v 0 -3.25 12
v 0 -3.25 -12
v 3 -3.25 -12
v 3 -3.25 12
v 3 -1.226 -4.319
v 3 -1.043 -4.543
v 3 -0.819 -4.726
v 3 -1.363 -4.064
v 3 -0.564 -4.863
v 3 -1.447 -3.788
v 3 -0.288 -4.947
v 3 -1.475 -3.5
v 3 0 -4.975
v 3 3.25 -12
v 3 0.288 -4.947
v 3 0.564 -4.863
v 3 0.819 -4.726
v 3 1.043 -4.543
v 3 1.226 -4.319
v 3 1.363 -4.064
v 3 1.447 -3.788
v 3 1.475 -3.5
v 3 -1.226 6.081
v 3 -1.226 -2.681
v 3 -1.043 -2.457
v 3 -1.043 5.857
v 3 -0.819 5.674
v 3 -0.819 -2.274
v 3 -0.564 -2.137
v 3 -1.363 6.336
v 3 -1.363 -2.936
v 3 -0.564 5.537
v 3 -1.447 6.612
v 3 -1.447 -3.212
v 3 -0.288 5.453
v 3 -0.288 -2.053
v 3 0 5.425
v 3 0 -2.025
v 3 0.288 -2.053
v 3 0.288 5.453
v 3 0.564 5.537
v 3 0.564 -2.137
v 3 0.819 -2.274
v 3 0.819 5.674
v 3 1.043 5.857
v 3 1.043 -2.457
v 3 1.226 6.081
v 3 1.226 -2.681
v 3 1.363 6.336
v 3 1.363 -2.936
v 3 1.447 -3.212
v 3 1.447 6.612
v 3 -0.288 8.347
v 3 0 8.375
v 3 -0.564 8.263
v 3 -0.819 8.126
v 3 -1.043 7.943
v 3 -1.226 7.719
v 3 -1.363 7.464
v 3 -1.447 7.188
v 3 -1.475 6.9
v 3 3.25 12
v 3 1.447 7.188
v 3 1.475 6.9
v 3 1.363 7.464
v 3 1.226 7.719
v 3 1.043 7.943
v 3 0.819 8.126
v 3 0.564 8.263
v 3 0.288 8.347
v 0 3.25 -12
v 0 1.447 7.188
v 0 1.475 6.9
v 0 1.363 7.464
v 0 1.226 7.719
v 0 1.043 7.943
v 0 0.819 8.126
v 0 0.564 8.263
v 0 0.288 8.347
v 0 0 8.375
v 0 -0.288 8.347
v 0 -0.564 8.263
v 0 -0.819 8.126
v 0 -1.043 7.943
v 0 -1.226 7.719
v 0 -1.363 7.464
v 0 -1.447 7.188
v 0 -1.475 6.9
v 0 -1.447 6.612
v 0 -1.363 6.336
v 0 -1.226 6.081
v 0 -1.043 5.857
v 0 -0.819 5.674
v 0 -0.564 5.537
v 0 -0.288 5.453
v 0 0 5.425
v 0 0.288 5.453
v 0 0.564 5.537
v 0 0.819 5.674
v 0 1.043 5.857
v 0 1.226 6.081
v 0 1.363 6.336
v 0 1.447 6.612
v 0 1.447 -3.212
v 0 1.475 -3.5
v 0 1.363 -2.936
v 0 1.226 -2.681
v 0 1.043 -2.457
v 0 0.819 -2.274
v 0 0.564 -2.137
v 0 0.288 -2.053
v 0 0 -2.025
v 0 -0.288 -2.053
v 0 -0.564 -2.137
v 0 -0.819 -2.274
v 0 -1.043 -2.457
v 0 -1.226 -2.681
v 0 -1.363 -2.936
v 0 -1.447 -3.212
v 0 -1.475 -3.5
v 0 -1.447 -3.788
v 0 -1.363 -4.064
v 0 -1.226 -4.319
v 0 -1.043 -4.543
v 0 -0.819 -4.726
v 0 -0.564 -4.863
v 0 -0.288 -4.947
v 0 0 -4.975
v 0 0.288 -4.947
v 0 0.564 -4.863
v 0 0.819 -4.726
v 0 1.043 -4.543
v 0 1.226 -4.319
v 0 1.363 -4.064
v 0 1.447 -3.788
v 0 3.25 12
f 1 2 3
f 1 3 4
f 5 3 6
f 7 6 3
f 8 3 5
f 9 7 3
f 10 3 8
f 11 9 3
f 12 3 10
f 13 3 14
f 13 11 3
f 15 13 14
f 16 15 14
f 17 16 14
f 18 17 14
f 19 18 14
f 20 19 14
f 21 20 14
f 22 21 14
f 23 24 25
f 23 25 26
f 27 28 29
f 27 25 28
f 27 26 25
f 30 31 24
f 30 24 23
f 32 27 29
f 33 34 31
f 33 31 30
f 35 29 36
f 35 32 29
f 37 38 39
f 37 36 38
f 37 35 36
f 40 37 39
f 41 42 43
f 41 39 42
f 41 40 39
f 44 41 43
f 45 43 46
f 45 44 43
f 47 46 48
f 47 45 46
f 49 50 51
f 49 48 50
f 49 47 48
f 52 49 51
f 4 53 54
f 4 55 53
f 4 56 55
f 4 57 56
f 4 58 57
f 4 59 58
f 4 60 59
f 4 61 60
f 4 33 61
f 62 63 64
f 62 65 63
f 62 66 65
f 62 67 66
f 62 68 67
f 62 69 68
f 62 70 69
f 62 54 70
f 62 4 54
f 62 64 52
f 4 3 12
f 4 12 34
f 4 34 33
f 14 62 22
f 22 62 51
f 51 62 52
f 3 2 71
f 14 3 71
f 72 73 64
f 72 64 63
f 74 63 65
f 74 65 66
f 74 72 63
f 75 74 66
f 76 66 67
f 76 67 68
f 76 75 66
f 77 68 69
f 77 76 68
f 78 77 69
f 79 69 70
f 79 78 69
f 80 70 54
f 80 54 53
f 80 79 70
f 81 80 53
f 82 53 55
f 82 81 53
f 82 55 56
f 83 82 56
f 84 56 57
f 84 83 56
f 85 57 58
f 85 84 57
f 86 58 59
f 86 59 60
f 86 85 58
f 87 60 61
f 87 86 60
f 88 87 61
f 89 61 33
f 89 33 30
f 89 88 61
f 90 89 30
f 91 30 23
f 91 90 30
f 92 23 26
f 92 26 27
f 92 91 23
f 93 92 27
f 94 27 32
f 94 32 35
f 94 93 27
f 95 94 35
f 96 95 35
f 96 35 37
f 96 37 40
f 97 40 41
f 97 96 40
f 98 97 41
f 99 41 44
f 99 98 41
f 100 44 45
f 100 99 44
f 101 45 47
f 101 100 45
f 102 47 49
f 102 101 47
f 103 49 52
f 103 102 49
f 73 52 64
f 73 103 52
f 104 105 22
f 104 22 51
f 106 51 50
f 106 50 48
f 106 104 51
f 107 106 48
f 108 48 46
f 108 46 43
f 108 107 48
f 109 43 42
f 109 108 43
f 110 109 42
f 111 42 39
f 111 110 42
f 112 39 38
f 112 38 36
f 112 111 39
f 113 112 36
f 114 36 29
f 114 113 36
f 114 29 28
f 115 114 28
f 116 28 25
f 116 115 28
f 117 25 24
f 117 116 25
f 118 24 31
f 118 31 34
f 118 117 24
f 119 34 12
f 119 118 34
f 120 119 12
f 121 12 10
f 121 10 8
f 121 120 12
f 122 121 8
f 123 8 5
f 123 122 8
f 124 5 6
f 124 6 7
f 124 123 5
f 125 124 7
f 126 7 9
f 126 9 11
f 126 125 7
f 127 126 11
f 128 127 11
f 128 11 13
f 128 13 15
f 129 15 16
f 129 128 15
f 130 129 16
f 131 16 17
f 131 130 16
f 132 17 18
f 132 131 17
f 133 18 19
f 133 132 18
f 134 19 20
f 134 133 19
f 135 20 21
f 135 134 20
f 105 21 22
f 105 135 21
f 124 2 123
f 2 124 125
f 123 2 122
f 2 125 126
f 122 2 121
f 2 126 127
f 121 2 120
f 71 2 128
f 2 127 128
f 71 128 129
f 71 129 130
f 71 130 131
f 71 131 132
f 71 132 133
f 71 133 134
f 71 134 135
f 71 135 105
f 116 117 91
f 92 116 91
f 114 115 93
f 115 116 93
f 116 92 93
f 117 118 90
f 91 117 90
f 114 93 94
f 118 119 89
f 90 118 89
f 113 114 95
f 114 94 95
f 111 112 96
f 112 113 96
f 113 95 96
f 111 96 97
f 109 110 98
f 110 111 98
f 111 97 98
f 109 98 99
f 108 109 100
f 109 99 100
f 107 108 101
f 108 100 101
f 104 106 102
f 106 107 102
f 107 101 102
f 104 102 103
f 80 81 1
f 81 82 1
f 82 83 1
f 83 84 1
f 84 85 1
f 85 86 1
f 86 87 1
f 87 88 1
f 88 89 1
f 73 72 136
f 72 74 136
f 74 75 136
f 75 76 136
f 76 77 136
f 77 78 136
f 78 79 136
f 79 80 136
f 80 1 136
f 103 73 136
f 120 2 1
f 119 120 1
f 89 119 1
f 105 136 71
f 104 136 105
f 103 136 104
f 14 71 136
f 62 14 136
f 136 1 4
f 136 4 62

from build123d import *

# Parameters (mm, degrees)
F0_W     = 6.5
F0_H     = 24
F0_R     = 1.475
F1_DEPTH = 3


with BuildPart() as f1:
    # F0 (on Right) → F1 (new body)
    with BuildSketch(Plane.YZ):
        Rectangle(F0_W, F0_H)
        with Locations((0, -3.5)):
            Circle(F0_R, mode=Mode.SUBTRACT)
        with Locations((0, 6.9)):
            Circle(F0_R, mode=Mode.SUBTRACT)
    extrude(amount=F1_DEPTH)


solid = f1.part
